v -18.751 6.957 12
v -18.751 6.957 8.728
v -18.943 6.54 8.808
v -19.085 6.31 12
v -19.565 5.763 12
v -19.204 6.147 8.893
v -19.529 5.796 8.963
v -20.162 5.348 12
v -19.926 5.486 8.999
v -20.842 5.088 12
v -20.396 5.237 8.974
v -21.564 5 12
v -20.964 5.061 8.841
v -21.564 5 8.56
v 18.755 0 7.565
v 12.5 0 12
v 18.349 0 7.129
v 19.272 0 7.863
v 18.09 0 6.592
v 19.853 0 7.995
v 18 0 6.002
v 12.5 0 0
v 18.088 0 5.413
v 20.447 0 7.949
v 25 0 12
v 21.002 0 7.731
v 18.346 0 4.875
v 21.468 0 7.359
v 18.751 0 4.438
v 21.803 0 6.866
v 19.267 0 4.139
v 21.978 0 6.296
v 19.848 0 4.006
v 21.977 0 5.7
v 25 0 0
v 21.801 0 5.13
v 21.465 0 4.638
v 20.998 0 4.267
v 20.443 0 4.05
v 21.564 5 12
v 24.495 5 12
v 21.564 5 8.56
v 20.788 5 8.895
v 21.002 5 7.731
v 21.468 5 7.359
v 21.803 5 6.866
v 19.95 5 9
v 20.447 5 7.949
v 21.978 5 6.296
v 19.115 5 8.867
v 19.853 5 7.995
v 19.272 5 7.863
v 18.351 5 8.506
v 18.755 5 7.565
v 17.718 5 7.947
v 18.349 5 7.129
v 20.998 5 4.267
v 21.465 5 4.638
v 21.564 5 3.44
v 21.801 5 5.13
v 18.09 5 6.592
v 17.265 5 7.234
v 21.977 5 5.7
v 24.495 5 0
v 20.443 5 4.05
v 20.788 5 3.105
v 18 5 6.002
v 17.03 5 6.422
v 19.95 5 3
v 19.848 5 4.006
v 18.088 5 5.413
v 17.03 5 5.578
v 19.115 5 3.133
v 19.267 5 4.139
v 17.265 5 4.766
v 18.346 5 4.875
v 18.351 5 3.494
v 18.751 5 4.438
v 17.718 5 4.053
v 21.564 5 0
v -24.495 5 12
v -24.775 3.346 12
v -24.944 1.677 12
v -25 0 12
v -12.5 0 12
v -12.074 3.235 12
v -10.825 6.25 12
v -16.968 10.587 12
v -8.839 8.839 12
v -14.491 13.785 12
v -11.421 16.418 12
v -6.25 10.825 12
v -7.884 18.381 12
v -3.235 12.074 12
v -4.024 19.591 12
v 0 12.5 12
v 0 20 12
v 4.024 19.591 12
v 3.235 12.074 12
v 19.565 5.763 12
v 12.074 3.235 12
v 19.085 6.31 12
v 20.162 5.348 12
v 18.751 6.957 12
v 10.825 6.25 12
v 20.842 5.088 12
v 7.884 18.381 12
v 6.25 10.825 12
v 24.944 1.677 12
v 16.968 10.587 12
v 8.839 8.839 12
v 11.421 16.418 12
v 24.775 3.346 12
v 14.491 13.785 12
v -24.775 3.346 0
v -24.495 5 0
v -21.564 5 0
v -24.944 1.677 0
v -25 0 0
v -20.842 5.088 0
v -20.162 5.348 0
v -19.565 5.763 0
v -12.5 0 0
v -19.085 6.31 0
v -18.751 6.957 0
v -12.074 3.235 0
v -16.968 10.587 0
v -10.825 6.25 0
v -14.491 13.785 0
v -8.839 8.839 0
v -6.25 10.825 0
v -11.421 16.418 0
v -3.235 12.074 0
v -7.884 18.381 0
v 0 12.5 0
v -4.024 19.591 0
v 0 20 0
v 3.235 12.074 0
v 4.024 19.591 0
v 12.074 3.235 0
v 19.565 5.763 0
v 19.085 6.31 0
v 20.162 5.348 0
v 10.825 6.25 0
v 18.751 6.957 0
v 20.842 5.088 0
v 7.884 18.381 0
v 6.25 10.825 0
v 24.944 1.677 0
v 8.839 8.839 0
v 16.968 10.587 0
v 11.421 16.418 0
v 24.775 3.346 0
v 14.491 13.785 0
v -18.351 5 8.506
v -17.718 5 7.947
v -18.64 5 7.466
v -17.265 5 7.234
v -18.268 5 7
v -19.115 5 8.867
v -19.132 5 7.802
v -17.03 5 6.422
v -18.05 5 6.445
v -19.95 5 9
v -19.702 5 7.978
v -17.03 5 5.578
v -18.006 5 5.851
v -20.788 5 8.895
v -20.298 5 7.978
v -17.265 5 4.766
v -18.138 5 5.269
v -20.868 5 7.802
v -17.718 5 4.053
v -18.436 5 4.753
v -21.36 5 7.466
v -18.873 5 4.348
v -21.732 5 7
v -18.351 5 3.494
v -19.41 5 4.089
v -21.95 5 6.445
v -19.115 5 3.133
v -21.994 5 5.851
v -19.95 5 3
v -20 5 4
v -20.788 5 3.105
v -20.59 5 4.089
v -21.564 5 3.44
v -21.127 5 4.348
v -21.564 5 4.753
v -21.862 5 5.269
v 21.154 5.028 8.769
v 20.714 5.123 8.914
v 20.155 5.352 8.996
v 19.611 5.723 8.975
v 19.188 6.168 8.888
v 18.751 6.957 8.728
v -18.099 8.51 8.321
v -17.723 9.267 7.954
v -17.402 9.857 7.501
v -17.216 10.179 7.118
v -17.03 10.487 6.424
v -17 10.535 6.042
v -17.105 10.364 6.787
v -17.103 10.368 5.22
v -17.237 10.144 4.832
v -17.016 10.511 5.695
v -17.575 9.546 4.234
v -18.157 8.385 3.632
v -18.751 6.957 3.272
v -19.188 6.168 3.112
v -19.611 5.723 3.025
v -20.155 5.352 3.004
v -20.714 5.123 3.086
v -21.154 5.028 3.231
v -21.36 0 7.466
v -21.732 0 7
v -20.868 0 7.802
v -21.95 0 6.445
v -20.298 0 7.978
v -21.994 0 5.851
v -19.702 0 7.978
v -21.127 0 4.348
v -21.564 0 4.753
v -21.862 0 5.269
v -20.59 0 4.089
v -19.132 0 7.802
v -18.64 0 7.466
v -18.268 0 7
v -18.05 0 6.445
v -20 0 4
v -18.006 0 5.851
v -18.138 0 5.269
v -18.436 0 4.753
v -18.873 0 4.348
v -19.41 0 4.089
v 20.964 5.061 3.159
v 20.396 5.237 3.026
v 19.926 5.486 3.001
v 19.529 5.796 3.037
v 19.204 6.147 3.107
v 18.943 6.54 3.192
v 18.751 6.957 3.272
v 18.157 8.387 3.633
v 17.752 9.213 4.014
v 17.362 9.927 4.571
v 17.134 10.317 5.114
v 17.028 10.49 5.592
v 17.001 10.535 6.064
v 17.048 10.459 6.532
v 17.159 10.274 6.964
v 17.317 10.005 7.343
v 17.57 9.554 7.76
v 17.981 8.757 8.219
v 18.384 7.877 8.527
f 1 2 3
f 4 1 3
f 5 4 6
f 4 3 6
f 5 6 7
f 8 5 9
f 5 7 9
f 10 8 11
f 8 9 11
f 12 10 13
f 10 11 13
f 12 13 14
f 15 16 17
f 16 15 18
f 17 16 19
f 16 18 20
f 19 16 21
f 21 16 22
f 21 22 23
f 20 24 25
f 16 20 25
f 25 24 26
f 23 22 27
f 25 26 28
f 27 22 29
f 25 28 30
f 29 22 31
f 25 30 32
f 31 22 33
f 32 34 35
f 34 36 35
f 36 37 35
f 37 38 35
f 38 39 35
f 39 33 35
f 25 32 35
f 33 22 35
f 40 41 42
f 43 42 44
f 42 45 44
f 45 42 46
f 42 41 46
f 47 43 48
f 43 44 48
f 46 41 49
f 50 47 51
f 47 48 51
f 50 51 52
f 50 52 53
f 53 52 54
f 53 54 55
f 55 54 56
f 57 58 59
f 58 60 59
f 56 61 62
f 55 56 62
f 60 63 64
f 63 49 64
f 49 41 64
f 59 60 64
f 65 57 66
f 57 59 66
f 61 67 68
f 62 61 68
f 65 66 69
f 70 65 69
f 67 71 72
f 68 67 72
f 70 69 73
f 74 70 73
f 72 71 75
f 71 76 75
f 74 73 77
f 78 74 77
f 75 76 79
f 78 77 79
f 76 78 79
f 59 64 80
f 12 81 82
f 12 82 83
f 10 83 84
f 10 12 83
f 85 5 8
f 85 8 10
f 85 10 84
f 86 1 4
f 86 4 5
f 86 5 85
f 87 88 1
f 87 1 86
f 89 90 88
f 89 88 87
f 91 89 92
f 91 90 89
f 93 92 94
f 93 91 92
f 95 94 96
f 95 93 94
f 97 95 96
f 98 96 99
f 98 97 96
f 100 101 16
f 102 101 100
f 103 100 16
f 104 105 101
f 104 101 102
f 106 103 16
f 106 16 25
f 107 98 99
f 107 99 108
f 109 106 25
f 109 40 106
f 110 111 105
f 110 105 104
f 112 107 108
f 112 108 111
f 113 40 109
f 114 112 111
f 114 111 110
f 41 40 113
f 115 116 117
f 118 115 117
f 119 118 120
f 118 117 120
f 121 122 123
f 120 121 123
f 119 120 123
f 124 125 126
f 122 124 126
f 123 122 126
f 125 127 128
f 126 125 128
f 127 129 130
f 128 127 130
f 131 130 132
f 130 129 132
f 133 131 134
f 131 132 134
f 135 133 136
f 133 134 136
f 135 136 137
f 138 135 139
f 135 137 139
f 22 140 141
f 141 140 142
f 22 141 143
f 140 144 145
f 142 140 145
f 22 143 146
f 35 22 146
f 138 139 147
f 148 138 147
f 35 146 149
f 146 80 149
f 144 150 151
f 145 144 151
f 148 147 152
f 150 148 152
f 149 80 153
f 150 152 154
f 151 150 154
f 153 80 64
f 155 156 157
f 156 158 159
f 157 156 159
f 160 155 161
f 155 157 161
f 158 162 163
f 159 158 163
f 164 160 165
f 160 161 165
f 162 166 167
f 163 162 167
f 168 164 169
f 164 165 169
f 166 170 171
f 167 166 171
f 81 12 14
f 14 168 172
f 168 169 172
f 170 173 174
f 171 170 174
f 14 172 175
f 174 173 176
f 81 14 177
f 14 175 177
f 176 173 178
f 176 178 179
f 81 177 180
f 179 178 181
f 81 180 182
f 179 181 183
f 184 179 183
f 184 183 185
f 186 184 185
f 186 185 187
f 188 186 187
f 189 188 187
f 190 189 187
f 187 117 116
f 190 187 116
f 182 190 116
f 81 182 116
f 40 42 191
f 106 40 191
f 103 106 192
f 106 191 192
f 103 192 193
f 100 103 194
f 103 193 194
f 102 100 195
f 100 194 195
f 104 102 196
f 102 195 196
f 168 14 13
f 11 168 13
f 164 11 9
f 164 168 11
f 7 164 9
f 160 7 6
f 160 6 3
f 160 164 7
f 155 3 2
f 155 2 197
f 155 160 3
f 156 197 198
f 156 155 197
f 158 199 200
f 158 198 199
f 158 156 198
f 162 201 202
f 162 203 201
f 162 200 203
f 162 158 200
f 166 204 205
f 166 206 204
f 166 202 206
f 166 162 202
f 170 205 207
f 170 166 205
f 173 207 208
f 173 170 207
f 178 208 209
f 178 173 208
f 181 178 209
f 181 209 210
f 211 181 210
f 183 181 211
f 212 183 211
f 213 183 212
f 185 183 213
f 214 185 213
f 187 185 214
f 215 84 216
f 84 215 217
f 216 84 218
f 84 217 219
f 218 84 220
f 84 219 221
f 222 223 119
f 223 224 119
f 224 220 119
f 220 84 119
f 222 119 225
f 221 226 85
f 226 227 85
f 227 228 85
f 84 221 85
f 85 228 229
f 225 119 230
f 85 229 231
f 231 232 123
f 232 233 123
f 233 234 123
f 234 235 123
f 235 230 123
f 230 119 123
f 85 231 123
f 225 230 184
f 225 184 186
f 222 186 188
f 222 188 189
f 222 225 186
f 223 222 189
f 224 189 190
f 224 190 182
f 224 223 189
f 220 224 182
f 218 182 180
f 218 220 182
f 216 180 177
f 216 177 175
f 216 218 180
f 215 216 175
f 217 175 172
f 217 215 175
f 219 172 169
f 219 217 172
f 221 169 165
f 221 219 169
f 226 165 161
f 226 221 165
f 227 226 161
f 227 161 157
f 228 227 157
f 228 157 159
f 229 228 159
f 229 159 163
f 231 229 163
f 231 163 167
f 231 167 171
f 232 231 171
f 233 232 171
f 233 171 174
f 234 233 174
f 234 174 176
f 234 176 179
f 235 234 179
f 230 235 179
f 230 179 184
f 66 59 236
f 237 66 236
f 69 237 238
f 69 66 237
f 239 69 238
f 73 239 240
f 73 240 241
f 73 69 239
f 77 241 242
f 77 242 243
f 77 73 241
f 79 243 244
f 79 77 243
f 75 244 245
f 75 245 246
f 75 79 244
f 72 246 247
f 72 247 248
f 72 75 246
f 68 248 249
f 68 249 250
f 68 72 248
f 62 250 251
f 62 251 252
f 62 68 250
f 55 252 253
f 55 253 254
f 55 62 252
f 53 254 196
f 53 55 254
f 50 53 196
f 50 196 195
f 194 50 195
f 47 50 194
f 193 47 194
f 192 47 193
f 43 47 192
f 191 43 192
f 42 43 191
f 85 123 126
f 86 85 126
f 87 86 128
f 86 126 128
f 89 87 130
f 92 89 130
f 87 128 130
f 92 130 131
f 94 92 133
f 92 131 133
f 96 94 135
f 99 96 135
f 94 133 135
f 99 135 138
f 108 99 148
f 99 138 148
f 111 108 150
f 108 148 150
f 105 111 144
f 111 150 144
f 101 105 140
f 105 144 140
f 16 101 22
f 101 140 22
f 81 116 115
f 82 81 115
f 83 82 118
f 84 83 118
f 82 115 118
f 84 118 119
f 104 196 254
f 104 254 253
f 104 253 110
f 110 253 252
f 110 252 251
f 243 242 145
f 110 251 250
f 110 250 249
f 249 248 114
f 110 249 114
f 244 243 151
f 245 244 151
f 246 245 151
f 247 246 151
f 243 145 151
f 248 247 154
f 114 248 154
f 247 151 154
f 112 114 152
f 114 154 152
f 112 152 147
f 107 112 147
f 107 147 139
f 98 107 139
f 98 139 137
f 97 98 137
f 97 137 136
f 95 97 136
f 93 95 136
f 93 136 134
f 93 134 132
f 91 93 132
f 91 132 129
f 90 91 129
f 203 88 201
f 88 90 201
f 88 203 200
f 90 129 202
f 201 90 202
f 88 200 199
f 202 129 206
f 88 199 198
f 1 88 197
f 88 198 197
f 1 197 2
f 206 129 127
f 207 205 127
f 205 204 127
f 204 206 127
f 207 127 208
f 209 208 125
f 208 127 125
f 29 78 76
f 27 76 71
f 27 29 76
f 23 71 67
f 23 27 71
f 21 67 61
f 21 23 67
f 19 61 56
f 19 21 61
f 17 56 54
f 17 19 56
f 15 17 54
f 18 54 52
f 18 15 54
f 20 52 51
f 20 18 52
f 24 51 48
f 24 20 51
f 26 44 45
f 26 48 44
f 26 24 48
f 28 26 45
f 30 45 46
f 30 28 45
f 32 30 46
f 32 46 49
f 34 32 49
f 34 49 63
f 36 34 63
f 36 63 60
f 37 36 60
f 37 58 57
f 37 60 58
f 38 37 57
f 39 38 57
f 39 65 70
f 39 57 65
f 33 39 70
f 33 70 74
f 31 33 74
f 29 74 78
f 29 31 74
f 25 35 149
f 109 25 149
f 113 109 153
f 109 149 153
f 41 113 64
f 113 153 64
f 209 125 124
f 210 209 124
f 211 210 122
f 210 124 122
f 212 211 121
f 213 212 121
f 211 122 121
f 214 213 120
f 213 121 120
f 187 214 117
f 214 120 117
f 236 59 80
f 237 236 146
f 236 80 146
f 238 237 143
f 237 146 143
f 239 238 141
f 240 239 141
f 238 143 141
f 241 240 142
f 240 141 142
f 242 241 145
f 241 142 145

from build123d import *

# Parameters (mm, degrees)
BOSS_EXTRUDE1_DEPTH = 12
SKETCH3_R           = 2
CUT_EXTRUDE1_DEPTH  = 10
SKETCH4_R           = 3
CUT_EXTRUDE2_DEPTH  = 10


with BuildPart() as part:
    # Sketch2 → Boss-Extrude1 (new body)
    with BuildSketch(Plane.XY):
        with BuildLine():
            Line((-25, 0), (-12.5, 0))
            ThreePointArc((-12.5, 0), (0, 12.5), (12.5, 0))
            Line((12.5, 0), (25, 0))
            ThreePointArc((25, 0), (24.873403825, 2.51272405), (24.494897428, 5))
            Line((24.494897428, 5), (21.563858653, 5))
            ThreePointArc((21.563858653, 5), (19.850737931, 5.537233793), (18.751181437, 6.956521739))
            ThreePointArc((18.751181437, 6.956521739), (0, 20), (-18.751181437, 6.956521739))
            ThreePointArc((-18.751181437, 6.956521739), (-19.850737931, 5.537233793), (-21.563858653, 5))
            Line((-21.563858653, 5), (-24.494897428, 5))
            ThreePointArc((-24.494897428, 5), (-24.873403825, 2.51272405), (-25, 0))
        make_face()
    extrude(amount=BOSS_EXTRUDE1_DEPTH)

    # Sketch3 → Cut-Extrude1 (cut)
    with BuildSketch(Plane(origin=(0, 0, 0), x_dir=(1, 0, 0), z_dir=(0, 1, 0))):
        with Locations(Location((20, -6, 0), (0, 0, 128.638810709))):
            Circle(SKETCH3_R)
        with Locations(Location((-20, -6, 0), (0, 0, 90))):
            Circle(SKETCH3_R)
    extrude(amount=CUT_EXTRUDE1_DEPTH, mode=Mode.SUBTRACT)

    # Sketch4 → Cut-Extrude2 (cut)
    with BuildSketch(Plane(origin=(0, 5, 0), x_dir=(1, 0, 0), z_dir=(0, 1, 0))):
        with Locations((20, -6)):
            Circle(SKETCH4_R)
        with Locations((-20, -6)):
            Circle(SKETCH4_R)
    extrude(amount=CUT_EXTRUDE2_DEPTH, mode=Mode.SUBTRACT)


solid = part.part
